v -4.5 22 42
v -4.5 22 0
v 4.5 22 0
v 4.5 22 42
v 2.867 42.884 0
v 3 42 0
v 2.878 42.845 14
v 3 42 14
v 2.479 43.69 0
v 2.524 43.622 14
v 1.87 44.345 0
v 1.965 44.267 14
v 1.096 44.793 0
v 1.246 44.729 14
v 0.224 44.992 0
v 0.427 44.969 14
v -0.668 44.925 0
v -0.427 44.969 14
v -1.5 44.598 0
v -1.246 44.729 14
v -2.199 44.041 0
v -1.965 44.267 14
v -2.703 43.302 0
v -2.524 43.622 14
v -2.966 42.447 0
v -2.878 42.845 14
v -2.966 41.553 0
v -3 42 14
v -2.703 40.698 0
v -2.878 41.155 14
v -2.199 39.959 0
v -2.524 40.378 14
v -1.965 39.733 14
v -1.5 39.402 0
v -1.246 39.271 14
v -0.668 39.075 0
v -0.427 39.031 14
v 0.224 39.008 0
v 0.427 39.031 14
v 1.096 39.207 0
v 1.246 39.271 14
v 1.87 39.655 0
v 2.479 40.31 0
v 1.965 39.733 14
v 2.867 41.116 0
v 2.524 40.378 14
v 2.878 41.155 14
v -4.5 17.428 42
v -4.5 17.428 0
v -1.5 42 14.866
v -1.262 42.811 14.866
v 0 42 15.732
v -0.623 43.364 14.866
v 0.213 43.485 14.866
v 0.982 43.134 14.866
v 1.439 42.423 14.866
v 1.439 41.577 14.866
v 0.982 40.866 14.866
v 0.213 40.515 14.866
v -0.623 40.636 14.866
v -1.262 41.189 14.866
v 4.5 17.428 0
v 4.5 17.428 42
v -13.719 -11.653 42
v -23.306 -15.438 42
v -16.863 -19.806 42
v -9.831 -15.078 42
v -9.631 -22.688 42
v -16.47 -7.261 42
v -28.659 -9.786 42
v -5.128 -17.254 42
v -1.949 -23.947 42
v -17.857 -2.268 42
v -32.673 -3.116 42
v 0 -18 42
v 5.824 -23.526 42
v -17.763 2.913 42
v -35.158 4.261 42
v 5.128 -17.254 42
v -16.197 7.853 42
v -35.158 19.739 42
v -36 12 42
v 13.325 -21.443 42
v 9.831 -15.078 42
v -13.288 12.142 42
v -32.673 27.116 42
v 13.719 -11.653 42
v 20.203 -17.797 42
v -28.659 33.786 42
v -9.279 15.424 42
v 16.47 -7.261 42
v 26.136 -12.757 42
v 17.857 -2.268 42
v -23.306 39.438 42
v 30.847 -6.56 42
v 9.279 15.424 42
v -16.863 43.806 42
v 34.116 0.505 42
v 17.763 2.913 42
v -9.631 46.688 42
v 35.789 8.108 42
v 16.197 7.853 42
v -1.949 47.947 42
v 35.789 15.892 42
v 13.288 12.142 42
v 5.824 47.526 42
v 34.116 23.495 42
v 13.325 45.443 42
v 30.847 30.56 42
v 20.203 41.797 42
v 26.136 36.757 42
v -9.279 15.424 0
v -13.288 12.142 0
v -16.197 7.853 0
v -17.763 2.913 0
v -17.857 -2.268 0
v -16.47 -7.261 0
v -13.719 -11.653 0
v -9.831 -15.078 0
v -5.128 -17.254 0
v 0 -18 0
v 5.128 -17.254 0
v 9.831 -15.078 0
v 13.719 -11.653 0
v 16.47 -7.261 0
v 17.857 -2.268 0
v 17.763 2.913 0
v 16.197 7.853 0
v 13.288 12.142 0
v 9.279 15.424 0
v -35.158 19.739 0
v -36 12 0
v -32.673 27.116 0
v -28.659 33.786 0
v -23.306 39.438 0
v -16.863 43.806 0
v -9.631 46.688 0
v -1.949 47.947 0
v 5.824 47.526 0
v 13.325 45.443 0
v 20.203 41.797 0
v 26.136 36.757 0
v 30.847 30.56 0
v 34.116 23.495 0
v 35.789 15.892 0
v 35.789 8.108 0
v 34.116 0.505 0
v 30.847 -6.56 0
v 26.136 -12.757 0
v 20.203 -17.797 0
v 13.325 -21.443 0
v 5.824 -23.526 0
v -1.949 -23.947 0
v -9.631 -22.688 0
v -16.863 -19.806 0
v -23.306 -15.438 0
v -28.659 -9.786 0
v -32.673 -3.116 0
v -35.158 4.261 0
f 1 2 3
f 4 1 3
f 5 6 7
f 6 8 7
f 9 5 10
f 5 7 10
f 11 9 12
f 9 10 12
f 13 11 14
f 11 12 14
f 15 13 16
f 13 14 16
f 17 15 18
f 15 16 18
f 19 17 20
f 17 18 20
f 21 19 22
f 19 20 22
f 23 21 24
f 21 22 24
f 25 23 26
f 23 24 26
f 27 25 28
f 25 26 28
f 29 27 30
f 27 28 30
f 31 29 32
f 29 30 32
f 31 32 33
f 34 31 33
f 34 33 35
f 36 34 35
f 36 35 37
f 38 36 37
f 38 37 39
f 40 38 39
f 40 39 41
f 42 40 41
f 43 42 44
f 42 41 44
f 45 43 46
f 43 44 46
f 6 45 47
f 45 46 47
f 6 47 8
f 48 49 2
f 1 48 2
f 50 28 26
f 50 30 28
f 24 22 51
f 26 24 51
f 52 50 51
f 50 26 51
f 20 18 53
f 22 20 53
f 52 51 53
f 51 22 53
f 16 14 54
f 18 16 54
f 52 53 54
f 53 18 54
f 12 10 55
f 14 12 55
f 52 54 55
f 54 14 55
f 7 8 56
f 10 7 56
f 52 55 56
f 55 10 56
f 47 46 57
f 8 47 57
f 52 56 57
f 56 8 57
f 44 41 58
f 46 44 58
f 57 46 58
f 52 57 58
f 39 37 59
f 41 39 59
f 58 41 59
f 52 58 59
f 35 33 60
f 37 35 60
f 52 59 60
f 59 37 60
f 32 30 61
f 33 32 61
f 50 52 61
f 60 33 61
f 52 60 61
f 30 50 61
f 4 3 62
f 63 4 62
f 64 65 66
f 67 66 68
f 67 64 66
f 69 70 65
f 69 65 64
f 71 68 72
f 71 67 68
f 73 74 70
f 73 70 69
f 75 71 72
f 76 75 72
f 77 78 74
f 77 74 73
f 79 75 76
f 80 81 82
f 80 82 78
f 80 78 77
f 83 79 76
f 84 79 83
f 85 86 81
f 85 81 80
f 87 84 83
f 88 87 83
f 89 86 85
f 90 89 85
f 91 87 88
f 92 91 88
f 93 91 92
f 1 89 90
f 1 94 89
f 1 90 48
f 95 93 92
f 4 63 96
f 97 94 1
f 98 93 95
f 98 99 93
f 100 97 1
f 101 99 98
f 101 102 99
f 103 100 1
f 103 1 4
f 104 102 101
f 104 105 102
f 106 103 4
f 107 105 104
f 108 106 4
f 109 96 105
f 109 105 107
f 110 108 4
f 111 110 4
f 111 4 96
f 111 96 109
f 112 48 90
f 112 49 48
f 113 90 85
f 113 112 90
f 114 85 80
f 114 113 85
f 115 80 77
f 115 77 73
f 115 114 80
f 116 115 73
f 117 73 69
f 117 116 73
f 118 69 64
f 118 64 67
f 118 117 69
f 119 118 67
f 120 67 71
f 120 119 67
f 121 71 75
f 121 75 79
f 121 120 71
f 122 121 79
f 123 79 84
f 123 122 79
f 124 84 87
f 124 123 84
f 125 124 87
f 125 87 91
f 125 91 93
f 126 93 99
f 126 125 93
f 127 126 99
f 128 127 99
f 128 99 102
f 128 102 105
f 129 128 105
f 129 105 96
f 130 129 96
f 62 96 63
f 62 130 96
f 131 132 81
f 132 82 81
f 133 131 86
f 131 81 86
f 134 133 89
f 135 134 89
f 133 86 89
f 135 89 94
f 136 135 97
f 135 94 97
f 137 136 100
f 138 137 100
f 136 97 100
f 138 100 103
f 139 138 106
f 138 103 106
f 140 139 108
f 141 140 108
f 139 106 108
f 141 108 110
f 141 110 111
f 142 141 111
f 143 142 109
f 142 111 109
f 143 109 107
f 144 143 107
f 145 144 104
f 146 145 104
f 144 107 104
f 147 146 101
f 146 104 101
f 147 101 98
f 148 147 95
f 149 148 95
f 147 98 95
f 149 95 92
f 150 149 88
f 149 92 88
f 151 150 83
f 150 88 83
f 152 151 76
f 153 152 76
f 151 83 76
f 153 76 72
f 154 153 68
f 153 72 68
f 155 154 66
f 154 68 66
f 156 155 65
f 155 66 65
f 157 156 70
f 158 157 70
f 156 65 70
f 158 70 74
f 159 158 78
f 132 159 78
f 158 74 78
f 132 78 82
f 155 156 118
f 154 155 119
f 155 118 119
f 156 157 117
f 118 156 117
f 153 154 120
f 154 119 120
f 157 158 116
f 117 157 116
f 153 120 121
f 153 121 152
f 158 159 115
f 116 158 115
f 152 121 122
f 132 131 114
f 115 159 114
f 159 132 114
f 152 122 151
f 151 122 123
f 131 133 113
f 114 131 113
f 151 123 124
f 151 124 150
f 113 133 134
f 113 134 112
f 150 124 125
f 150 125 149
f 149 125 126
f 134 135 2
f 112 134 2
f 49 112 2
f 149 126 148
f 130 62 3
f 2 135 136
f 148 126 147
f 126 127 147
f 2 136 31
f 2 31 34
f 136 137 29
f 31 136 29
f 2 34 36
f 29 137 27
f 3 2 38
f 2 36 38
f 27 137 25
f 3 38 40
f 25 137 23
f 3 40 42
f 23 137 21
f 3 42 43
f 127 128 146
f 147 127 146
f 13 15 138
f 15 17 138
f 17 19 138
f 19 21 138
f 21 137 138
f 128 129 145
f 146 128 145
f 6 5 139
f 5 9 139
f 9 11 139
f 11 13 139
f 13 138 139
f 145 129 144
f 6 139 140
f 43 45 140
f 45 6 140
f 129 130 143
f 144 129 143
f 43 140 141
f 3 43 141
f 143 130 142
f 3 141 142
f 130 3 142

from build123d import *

# Parameters (mm, degrees)
ESQUISSE1_W                        = 36
ESQUISSE1_H                        = 42
ENL_V_MAT_EXTRU_1_REACH            = 75.239
ESQUISSE3_W                        = 18
ESQUISSE3_H                        = 42
DIAM_TRE_DU_PER_AGE_M6_0_6_1_D     = 6
DIAM_TRE_DU_PER_AGE_M6_0_6_1_DEPTH = 14
DIAM_TRE_DU_PER_AGE_M6_0_6_1_TIP   = 1.732050808


with BuildPart() as part:
    # Esquisse1 → Révolution1 (revolve)
    with BuildSketch(Plane.XZ.offset(-12), mode=Mode.PRIVATE) as r_volution1_sk:
        with Locations((18, 21)):
            Rectangle(ESQUISSE1_W, ESQUISSE1_H)
    revolve(r_volution1_sk.sketch.rotate(Axis((0, 12, 42), (0, 0, -1)), 180), axis=Axis((0, 12, 42), (0, 0, -1)))

    # Esquisse2 → Enlèv. mat.-Extru.1 (cut, up to next)
    with BuildSketch(Plane(origin=(0, 0, 0), x_dir=(-1, 0, 0), z_dir=(0, 0, -1)), mode=Mode.PRIVATE) as enl_v_mat_extru_1_sk1:
        with BuildLine():
            Line((4.5, 22), (-4.5, 22))
            Line((-4.5, 22), (-4.5, 17.428425058))
            ThreePointArc((-4.5, 17.428425058), (0, 18), (4.5, 17.428425058))
            Line((4.5, 17.428425058), (4.5, 22))
        make_face()
    enl_v_mat_extru_1_tool1 = extrude(enl_v_mat_extru_1_sk1.sketch, amount=-ENL_V_MAT_EXTRU_1_REACH, mode=Mode.PRIVATE) & part.part
    add(enl_v_mat_extru_1_tool1.solids().sort_by_distance((0, 19.901901, 0))[0], mode=Mode.SUBTRACT)

    # Esquisse3 → Enlèvement de matière-Révolution1 (revolve, cut)
    with BuildSketch(Plane(origin=(0, 0, 0), x_dir=(1, 0, 0), z_dir=(0, 1, 0))):
        with Locations((9, -21)):
            Rectangle(ESQUISSE3_W, ESQUISSE3_H)
    revolve(axis=Axis((0, 0, 0), (0, 0, 1)), mode=Mode.SUBTRACT)

    # Diamètre du perçage M6.0 (6)1
    with Locations(Plane(origin=(0, 0, 0), x_dir=(-1, 0, 0), z_dir=(0, 0, -1))):
        with Locations((0, 42)):
            Hole(DIAM_TRE_DU_PER_AGE_M6_0_6_1_D / 2, depth=DIAM_TRE_DU_PER_AGE_M6_0_6_1_DEPTH)
            with Locations((0, 0, -(DIAM_TRE_DU_PER_AGE_M6_0_6_1_DEPTH + DIAM_TRE_DU_PER_AGE_M6_0_6_1_TIP / 2))):  # 120° drill point
                Cone(0, DIAM_TRE_DU_PER_AGE_M6_0_6_1_D / 2, DIAM_TRE_DU_PER_AGE_M6_0_6_1_TIP, mode=Mode.SUBTRACT)


solid = part.part
